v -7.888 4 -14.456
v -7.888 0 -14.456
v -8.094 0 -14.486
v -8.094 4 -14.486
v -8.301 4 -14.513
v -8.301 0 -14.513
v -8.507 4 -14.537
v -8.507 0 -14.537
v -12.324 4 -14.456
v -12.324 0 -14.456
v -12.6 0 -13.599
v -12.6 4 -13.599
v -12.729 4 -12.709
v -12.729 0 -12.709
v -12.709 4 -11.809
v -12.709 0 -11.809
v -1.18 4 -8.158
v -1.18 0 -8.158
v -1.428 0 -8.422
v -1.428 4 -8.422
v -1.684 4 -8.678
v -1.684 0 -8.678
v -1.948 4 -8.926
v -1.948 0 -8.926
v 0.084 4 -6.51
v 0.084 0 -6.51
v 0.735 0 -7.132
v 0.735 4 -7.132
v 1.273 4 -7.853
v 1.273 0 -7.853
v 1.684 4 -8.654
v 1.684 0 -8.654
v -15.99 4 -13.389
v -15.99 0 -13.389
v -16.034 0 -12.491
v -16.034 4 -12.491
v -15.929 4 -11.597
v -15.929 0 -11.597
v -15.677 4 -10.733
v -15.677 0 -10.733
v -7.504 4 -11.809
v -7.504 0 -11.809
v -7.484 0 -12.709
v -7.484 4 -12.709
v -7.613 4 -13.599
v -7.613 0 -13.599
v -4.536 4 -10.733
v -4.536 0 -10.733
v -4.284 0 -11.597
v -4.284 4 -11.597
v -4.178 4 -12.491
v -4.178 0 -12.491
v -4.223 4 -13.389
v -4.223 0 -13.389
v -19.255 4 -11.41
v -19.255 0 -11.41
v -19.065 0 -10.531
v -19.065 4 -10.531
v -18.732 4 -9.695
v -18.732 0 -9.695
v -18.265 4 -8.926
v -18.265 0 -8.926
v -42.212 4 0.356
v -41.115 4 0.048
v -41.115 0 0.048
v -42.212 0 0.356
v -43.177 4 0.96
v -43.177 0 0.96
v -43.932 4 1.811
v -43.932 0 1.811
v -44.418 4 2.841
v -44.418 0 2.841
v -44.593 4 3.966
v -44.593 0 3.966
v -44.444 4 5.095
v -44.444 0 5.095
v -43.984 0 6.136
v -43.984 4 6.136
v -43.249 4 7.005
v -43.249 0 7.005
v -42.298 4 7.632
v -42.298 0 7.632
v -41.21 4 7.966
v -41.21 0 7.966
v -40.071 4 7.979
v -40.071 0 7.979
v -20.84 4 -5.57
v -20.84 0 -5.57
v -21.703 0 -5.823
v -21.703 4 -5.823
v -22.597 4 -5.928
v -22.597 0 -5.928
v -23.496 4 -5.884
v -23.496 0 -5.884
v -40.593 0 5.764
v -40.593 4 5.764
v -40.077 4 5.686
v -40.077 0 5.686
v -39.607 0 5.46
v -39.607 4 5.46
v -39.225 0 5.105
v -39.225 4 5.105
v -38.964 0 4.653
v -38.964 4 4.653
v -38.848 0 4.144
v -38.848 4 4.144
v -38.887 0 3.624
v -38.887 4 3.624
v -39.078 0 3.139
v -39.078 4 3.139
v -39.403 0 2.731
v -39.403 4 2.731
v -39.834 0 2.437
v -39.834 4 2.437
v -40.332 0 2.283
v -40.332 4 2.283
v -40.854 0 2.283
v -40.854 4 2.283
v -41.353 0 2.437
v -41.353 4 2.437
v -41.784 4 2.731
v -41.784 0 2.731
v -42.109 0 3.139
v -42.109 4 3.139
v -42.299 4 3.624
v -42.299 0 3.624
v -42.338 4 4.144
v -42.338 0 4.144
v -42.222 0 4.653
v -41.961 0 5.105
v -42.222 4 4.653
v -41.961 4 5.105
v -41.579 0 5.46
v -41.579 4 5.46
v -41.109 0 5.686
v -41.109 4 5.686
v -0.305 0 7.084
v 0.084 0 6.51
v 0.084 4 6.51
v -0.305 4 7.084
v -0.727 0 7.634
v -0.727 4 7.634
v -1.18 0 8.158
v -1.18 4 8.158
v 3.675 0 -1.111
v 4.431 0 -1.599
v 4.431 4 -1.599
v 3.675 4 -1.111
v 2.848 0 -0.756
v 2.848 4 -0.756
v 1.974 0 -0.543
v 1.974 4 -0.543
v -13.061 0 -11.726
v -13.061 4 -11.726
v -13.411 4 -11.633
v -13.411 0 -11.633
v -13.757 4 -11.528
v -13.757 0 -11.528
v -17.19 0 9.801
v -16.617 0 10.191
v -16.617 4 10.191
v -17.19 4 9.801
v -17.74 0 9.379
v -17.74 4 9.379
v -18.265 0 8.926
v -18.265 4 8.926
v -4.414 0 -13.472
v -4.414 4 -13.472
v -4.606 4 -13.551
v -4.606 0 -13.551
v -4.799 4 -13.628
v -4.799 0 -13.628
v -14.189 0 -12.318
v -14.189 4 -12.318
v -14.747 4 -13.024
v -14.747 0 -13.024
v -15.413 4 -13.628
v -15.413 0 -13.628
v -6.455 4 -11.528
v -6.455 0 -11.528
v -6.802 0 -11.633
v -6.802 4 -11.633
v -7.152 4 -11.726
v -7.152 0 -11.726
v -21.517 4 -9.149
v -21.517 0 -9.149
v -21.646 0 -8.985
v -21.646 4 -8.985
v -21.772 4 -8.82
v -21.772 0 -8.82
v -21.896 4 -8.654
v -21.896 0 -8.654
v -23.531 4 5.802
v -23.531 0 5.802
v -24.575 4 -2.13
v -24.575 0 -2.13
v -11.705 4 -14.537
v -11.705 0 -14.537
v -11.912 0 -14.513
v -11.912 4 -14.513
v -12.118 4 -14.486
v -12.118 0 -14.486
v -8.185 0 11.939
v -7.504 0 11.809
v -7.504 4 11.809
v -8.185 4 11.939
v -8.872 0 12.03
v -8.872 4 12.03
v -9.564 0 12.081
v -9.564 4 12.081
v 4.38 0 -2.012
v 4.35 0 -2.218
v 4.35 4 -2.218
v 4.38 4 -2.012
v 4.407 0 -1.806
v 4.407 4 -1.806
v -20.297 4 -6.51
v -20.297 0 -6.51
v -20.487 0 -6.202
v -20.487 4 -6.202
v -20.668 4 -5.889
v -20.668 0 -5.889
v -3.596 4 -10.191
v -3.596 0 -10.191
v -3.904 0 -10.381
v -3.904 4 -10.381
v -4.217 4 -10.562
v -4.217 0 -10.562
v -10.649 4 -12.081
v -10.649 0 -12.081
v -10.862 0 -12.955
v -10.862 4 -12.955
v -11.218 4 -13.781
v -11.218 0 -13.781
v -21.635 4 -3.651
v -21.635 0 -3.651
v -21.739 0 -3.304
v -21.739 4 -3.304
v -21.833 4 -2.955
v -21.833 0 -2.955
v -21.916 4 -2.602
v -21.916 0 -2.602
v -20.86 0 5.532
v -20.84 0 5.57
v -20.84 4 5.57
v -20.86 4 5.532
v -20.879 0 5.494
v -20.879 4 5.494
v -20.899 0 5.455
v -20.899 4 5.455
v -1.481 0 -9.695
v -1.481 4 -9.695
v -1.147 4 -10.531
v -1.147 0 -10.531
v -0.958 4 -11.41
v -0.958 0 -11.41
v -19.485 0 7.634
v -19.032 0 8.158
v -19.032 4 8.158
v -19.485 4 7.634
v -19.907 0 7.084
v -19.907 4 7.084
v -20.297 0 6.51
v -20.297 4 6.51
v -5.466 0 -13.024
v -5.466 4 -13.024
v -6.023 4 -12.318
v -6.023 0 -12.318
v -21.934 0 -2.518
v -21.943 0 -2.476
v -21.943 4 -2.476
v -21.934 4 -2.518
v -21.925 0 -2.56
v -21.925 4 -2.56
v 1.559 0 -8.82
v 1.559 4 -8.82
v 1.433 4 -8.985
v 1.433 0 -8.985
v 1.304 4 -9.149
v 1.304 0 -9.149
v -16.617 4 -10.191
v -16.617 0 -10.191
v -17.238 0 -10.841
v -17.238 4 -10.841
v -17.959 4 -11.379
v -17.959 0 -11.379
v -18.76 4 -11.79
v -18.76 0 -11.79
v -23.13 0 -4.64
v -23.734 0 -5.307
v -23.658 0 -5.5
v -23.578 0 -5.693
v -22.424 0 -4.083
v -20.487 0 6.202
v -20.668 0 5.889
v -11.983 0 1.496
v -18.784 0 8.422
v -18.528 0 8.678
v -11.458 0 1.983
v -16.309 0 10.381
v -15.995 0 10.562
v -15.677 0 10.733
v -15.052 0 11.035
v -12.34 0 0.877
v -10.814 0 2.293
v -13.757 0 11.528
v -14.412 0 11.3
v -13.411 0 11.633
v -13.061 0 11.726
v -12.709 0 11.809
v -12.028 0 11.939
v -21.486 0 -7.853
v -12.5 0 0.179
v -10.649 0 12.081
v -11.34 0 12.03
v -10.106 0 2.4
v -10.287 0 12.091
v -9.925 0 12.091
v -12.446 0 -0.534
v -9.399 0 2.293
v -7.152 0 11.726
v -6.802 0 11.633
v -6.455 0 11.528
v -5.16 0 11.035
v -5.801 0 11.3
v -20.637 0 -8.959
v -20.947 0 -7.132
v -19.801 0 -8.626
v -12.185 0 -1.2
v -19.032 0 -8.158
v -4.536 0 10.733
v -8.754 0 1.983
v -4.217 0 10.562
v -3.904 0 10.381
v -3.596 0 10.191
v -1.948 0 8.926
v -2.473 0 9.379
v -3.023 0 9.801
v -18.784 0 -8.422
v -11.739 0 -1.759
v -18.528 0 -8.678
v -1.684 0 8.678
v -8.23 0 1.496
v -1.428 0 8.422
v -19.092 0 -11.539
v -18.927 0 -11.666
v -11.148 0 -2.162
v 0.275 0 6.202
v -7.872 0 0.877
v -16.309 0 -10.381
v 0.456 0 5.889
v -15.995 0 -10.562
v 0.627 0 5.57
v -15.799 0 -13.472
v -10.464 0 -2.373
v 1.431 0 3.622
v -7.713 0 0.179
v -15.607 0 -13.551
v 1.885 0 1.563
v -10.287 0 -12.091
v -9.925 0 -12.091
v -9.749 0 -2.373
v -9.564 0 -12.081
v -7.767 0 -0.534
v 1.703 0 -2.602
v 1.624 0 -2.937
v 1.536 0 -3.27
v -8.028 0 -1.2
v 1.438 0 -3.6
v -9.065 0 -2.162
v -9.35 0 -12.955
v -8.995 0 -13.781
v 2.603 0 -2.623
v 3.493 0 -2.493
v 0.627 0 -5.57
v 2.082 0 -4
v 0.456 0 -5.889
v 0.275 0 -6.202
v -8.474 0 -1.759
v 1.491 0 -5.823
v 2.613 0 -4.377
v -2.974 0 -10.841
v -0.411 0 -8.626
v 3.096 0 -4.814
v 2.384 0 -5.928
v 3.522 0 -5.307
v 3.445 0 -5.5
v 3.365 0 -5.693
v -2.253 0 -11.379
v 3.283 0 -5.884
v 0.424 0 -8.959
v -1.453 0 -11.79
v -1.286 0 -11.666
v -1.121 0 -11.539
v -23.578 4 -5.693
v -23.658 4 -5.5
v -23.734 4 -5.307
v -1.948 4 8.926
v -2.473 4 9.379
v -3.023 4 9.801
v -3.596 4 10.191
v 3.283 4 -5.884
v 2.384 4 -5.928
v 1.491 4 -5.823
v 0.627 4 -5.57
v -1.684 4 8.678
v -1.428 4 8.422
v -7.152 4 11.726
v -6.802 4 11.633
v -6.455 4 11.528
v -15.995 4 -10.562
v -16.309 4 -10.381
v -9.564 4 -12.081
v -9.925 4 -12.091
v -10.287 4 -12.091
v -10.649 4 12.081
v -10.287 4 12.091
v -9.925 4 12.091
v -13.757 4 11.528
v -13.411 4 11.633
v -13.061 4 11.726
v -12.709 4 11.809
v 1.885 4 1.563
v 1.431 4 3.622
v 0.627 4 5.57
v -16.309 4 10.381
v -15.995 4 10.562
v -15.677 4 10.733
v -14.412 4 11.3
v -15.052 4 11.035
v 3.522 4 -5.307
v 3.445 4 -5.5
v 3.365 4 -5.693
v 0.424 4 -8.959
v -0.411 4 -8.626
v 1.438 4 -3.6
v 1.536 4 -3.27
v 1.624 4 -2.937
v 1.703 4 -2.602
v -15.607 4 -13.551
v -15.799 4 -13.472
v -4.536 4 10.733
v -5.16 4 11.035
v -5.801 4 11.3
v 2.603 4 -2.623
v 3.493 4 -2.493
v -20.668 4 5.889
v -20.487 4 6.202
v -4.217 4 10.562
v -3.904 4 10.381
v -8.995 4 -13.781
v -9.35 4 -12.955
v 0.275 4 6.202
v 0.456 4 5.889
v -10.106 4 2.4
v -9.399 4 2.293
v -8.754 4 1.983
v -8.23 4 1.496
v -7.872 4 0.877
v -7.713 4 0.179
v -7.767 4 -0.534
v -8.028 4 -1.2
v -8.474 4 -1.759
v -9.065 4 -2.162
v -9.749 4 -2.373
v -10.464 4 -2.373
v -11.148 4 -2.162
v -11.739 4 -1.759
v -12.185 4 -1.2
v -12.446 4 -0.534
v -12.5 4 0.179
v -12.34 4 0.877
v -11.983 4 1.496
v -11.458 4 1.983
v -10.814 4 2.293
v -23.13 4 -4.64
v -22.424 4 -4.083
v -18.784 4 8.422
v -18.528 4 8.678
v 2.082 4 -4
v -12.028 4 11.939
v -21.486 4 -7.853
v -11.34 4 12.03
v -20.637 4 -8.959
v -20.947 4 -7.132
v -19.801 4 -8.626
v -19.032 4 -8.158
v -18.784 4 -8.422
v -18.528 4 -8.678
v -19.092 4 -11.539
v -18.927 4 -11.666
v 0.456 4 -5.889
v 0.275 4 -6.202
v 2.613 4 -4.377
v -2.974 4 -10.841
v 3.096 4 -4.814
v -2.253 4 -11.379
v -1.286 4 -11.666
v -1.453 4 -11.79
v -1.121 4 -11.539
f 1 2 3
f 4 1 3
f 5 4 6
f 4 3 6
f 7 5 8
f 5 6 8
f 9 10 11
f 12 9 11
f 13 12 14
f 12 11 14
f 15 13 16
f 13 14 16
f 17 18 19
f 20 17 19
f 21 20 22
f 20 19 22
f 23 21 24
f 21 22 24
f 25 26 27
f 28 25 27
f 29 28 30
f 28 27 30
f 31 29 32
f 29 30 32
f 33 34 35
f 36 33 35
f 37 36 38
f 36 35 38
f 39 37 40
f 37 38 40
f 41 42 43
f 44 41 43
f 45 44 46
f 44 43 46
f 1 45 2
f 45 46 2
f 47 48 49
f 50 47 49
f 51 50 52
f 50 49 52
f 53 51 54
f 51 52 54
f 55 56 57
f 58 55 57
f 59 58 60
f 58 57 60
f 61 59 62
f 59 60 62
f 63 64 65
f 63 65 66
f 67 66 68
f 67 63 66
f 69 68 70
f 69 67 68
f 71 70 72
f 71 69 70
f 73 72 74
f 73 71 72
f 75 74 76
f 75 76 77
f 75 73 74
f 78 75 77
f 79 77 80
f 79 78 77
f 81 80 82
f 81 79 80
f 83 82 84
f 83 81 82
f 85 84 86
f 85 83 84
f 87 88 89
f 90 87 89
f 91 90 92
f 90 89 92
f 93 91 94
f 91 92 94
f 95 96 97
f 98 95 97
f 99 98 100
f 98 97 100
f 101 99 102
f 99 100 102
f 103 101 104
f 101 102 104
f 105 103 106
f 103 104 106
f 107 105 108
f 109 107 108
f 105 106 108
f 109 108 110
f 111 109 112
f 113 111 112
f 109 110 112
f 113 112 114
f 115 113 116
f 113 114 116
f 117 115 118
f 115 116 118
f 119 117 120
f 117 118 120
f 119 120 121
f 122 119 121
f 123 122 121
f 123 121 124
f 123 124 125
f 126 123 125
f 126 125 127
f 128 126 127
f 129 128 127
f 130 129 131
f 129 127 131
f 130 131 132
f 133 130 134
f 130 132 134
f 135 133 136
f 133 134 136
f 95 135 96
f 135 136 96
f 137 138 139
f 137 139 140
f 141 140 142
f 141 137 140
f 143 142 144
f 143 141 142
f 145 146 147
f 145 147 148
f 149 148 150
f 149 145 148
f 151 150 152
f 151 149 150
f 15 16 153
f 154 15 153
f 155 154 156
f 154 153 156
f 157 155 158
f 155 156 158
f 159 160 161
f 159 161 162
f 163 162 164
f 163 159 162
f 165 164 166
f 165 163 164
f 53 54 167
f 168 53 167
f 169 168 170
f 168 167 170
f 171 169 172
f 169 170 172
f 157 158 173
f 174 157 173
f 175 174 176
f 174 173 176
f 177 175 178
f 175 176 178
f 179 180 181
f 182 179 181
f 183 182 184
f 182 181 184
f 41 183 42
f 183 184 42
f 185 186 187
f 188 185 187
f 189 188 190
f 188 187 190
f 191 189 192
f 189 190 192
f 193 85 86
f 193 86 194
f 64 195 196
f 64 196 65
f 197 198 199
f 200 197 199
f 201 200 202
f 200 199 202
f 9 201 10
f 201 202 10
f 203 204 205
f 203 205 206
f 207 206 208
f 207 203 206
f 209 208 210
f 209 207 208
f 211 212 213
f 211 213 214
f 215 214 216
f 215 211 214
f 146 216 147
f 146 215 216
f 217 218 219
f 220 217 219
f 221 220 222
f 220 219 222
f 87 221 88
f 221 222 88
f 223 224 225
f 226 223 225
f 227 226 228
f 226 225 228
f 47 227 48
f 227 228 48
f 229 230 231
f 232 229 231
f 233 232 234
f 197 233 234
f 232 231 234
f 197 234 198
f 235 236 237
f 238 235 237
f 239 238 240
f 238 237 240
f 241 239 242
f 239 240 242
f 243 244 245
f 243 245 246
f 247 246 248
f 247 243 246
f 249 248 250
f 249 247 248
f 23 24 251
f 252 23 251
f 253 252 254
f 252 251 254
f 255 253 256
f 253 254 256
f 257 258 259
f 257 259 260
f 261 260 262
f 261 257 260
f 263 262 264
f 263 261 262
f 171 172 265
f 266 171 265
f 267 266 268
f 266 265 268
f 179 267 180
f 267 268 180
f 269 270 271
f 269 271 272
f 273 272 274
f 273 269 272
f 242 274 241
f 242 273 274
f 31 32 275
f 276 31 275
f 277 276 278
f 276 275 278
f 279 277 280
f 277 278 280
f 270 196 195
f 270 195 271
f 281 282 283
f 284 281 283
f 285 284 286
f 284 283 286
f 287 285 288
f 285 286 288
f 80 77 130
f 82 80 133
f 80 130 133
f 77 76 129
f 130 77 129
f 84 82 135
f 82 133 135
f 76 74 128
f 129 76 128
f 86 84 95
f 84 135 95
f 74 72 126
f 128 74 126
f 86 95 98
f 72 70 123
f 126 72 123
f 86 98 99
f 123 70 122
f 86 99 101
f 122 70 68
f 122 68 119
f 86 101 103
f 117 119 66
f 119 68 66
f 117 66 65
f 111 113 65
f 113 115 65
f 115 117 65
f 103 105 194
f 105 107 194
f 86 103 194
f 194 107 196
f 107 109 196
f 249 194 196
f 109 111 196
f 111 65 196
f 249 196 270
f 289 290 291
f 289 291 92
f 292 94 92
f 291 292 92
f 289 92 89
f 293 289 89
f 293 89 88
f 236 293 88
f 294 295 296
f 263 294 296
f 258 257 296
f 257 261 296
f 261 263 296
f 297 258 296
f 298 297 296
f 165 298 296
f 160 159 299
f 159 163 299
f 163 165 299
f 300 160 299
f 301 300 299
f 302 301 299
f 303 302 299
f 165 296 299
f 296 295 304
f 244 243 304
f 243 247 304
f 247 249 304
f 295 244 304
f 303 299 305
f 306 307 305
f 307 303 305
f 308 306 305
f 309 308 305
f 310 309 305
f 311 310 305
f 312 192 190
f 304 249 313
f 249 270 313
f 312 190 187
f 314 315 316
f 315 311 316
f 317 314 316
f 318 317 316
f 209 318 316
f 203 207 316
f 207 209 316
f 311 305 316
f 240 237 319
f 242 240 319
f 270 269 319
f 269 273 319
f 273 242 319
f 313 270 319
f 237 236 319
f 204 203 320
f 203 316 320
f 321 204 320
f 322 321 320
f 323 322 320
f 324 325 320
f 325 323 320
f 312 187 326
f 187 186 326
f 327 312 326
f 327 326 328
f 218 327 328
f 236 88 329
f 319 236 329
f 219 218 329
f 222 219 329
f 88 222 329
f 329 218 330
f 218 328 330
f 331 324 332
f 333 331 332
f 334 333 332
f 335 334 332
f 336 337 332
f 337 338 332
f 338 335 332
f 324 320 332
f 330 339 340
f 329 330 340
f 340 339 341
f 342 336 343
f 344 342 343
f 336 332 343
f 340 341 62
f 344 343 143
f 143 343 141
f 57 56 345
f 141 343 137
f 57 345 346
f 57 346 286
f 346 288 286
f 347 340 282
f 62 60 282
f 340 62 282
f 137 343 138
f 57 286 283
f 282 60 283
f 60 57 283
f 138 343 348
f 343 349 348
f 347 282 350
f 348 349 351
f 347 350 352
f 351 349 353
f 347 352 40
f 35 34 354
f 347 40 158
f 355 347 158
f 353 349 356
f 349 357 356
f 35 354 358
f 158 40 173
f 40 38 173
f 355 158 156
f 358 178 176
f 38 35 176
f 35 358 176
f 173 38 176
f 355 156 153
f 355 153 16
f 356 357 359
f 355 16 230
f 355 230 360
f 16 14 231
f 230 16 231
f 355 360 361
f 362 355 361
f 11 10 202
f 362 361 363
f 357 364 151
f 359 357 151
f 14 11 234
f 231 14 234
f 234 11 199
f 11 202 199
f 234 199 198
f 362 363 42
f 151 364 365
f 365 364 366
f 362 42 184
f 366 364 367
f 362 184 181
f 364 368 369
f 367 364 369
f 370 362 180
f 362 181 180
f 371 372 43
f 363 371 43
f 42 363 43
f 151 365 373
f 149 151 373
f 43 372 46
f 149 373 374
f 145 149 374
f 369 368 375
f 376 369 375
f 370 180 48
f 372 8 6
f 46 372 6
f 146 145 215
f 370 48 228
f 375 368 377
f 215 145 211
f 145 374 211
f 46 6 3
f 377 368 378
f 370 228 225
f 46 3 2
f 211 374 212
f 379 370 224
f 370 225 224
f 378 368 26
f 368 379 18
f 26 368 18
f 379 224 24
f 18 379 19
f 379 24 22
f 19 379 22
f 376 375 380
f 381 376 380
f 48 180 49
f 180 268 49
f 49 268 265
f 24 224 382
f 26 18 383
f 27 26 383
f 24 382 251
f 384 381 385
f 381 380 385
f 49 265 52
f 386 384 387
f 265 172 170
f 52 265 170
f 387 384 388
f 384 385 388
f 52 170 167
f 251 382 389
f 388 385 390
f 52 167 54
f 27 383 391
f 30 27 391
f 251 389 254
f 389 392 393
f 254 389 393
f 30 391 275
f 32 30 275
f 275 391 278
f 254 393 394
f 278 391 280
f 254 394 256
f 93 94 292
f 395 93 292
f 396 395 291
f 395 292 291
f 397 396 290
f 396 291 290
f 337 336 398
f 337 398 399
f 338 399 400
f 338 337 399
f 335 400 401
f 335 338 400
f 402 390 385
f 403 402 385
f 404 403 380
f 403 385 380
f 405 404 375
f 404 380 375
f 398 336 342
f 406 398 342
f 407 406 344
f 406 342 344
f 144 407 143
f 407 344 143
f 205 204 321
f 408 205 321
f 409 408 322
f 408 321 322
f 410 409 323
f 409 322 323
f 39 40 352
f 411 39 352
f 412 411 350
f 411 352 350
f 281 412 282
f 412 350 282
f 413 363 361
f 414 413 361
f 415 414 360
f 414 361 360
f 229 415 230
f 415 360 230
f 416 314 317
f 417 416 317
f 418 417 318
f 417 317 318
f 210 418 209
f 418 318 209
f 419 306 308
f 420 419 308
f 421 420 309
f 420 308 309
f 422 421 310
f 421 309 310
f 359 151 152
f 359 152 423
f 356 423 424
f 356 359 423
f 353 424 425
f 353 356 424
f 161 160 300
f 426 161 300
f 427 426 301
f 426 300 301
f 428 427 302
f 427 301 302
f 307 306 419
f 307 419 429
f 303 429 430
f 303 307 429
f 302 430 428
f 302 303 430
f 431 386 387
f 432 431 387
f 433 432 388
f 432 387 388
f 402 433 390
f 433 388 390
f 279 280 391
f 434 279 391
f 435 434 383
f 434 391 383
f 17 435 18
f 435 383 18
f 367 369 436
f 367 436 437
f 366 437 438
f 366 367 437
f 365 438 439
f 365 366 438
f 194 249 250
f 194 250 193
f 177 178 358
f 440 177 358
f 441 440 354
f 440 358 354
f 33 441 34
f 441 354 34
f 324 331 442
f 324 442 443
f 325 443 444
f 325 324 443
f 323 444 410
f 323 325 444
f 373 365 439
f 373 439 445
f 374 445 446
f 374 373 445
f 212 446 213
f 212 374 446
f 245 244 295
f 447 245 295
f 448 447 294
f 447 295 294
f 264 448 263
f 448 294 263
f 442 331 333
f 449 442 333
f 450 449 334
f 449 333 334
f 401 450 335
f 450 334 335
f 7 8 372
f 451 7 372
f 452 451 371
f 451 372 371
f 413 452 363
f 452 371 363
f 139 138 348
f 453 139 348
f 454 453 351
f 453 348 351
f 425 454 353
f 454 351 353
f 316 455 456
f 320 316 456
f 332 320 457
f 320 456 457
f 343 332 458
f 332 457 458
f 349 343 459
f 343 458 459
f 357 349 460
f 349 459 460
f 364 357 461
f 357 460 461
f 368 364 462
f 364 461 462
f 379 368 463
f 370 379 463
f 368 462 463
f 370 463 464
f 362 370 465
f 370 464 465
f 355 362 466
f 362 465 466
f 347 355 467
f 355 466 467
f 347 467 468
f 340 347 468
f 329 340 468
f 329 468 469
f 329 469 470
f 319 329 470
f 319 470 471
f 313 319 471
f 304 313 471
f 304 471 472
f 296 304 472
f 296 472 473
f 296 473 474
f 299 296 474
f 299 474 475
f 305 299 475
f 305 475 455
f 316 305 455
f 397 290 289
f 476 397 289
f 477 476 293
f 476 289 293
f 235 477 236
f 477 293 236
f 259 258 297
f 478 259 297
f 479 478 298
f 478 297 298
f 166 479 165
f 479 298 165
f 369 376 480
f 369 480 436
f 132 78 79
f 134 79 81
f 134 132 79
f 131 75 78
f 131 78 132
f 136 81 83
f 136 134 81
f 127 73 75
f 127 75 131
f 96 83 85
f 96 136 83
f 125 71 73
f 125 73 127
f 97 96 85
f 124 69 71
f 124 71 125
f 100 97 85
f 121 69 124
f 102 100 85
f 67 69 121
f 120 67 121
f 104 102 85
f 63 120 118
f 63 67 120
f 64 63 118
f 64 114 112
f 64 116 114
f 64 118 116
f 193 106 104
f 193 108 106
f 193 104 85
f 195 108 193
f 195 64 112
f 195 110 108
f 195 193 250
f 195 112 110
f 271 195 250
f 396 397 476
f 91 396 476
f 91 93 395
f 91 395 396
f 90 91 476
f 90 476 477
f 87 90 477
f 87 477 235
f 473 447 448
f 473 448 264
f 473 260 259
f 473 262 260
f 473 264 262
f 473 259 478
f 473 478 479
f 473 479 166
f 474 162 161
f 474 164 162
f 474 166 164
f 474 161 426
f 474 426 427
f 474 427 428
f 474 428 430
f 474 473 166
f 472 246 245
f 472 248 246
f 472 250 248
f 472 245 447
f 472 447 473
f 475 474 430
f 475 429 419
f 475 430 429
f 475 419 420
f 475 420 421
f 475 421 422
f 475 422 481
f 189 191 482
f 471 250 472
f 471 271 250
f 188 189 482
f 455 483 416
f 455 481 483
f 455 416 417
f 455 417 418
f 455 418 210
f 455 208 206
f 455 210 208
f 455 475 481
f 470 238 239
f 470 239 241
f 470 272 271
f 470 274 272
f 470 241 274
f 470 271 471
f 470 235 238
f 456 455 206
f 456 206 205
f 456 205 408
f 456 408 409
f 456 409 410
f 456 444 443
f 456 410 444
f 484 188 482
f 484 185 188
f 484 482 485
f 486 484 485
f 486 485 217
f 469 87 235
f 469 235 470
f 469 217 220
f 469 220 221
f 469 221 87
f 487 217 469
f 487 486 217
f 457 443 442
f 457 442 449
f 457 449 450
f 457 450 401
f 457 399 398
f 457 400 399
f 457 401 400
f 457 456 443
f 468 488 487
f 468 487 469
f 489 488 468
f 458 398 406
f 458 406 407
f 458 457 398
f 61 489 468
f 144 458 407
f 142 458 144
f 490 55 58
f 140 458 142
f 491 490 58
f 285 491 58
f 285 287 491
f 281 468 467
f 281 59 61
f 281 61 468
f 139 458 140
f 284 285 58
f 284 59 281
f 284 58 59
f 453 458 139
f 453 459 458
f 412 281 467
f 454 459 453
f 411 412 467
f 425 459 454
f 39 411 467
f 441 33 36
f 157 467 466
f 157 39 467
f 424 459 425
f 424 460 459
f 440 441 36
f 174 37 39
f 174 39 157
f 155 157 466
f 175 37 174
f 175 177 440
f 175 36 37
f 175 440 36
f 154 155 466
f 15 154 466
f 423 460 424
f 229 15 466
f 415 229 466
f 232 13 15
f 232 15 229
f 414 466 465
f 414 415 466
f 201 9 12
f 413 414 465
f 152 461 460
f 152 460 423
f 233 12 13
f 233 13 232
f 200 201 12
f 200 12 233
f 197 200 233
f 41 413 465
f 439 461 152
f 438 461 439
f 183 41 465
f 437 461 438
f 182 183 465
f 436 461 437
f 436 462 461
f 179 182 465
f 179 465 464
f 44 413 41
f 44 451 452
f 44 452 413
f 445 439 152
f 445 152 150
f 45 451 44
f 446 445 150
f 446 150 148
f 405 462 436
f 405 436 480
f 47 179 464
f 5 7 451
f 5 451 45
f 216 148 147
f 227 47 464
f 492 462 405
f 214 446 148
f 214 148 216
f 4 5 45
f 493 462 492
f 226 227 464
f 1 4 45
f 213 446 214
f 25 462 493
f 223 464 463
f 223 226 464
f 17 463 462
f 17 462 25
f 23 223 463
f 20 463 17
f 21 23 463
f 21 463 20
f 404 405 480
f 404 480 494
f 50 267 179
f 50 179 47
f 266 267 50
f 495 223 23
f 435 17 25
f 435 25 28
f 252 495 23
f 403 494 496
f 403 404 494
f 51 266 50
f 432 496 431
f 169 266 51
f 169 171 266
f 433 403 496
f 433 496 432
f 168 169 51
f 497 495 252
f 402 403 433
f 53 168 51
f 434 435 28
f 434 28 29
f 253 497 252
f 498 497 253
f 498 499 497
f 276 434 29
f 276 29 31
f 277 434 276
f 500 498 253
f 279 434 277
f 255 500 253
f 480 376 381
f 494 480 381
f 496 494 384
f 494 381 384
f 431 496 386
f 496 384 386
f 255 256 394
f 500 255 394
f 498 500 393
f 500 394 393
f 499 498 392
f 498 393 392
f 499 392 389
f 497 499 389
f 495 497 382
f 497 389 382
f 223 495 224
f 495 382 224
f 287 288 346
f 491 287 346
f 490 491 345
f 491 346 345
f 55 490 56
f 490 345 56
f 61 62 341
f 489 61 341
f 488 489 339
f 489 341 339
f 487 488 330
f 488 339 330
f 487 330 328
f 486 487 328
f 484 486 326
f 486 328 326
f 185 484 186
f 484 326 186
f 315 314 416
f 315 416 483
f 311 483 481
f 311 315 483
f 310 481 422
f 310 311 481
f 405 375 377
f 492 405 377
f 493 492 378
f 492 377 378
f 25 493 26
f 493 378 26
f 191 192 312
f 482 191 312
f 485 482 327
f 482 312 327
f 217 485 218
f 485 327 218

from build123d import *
from build123d.topology import SkipClean

# Parameters (mm, degrees)
SKETCH1_R           = 1.5
BOSS_EXTRUDE1_DEPTH = 4
SKETCH3_R           = 1.75
BOSS_EXTRUDE2_DEPTH = 4
CUT_EXTRUDE1_START  = -4
CUT_EXTRUDE1_DEPTH  = 4
CUT_EXTRUDE2_REACH  = 49.073
SKETCH5_R           = 2.4


with BuildPart() as part:
    # Sketch1 → Boss-Extrude1 (new body)
    with BuildSketch(Plane(origin=(0, 0, 0), x_dir=(1, 0, 0), z_dir=(0, 1, 0))):
        with BuildLine():
            Line((20.643657446, 4), (2.081641936, 4))
            ThreePointArc((2.081641936, 4), (2.861028333, 4.588201733), (3.521749436, 5.30713988))
            ThreePointArc((3.521749436, 5.30713988), (3.405395609, 5.596745198), (3.282888305, 5.883801663))
            ThreePointArc((3.282888305, 5.883801663), (1.93527598, 5.894040025), (0.627094961, 5.57027124))
            ThreePointArc((0.627094961, 5.57027124), (0.366286148, 6.046375), (0.084372603, 6.510293938))
            ThreePointArc((0.084372603, 6.510293938), (1.018855105, 7.48132754), (1.683794586, 8.65351323))
            ThreePointArc((1.683794586, 8.65351323), (1.496450048, 8.903135899), (1.303821399, 9.148703928))
            ThreePointArc((1.303821399, 9.148703928), (-0.000522033, 8.809805691), (-1.180330337, 8.158486898))
            ThreePointArc((-1.180330337, 8.158486898), (-1.555477026, 8.550865528), (-1.947855656, 8.926012217))
            ThreePointArc((-1.947855656, 8.926012217), (-1.296536862, 10.105820521), (-0.957638625, 11.410163953))
            ThreePointArc((-0.957638625, 11.410163953), (-1.203206655, 11.602792602), (-1.452829324, 11.79013714))
            ThreePointArc((-1.452829324, 11.79013714), (-2.625015014, 11.125197659), (-3.596048616, 10.190715157))
            ThreePointArc((-3.596048616, 10.190715157), (-4.059967554, 10.472628702), (-4.536071314, 10.733437515))
            ThreePointArc((-4.536071314, 10.733437515), (-4.212302529, 12.041618533), (-4.222540891, 13.389230859))
            ThreePointArc((-4.222540891, 13.389230859), (-4.509597355, 13.511738163), (-4.799202674, 13.62809199))
            ThreePointArc((-4.799202674, 13.62809199), (-5.759348103, 12.682425791), (-6.455432668, 11.528463019))
            ThreePointArc((-6.455432668, 11.528463019), (-6.976508546, 11.680699536), (-7.503891752, 11.809396783))
            ThreePointArc((-7.503891752, 11.809396783), (-7.529737283, 13.156800143), (-7.888414517, 14.455843809))
            ThreePointArc((-7.888414517, 14.455843809), (-8.197396993, 14.499881098), (-8.507248835, 14.537314892))
            ThreePointArc((-8.507248835, 14.537314892), (-9.18992168, 13.375367565), (-9.563620196, 12.080565177))
            ThreePointArc((-9.563620196, 12.080565177), (-10.106342554, 12.09275), (-10.649064912, 12.080565177))
            ThreePointArc((-10.649064912, 12.080565177), (-11.022763428, 13.375367565), (-11.705436272, 14.537314892))
            ThreePointArc((-11.705436272, 14.537314892), (-12.015288115, 14.499881098), (-12.324270591, 14.455843809))
            ThreePointArc((-12.324270591, 14.455843809), (-12.682947825, 13.156800143), (-12.708793355, 11.809396783))
            ThreePointArc((-12.708793355, 11.809396783), (-13.236176561, 11.680699536), (-13.757252439, 11.528463019))
            ThreePointArc((-13.757252439, 11.528463019), (-14.453337005, 12.682425791), (-15.413482434, 13.62809199))
            ThreePointArc((-15.413482434, 13.62809199), (-15.703087752, 13.511738163), (-15.990144217, 13.389230859))
            ThreePointArc((-15.990144217, 13.389230859), (-16.000382579, 12.041618533), (-15.676613793, 10.733437515))
            ThreePointArc((-15.676613793, 10.733437515), (-16.152717554, 10.472628702), (-16.616636492, 10.190715157))
            ThreePointArc((-16.616636492, 10.190715157), (-17.587670094, 11.125197659), (-18.759855783, 11.79013714))
            ThreePointArc((-18.759855783, 11.79013714), (-19.009478453, 11.602792602), (-19.255046482, 11.410163953))
            ThreePointArc((-19.255046482, 11.410163953), (-18.916148245, 10.105820521), (-18.264829452, 8.926012217))
            ThreePointArc((-18.264829452, 8.926012217), (-18.657208082, 8.550865528), (-19.032354771, 8.158486898))
            ThreePointArc((-19.032354771, 8.158486898), (-20.212163074, 8.809805691), (-21.516506507, 9.148703928))
            ThreePointArc((-21.516506507, 9.148703928), (-21.709135156, 8.903135899), (-21.896479694, 8.65351323))
            ThreePointArc((-21.896479694, 8.65351323), (-21.231540213, 7.48132754), (-20.297057711, 6.510293938))
            ThreePointArc((-20.297057711, 6.510293938), (-20.578971255, 6.046375), (-20.839780068, 5.57027124))
            ThreePointArc((-20.839780068, 5.57027124), (-22.147961087, 5.894040025), (-23.495573413, 5.883801663))
            ThreePointArc((-23.495573413, 5.883801663), (-23.618080717, 5.596745198), (-23.734434544, 5.30713988))
            ThreePointArc((-23.734434544, 5.30713988), (-22.788768345, 4.346994451), (-21.634805572, 3.650909885))
            ThreePointArc((-21.634805572, 3.650909885), (-21.78704209, 3.129834008), (-21.915739337, 2.602450802))
            ThreePointArc((-21.915739337, 2.602450802), (-23.263142697, 2.576605271), (-24.562186363, 2.217928037))
            ThreePointArc((-24.562186363, 2.217928037), (-24.606223651, 1.908945561), (-24.643657446, 1.599093719))
            ThreePointArc((-24.643657446, 1.599093719), (-23.481710119, 0.916420874), (-22.186907731, 0.542722358))
            ThreePointArc((-22.186907731, 0.542722358), (-22.199092554, 0), (-22.186907731, -0.542722358))
            ThreePointArc((-22.186907731, -0.542722358), (-23.481710119, -0.916420874), (-24.643657446, -1.599093719))
            ThreePointArc((-24.643657446, -1.599093719), (-24.606223651, -1.908945561), (-24.562186363, -2.217928037))
            ThreePointArc((-24.562186363, -2.217928037), (-23.263142697, -2.576605271), (-21.915739337, -2.602450802))
            ThreePointArc((-21.915739337, -2.602450802), (-21.78704209, -3.129834008), (-21.634805572, -3.650909885))
            ThreePointArc((-21.634805572, -3.650909885), (-22.788768345, -4.346994451), (-23.734434544, -5.30713988))
            ThreePointArc((-23.734434544, -5.30713988), (-23.618080717, -5.596745198), (-23.495573413, -5.883801663))
            ThreePointArc((-23.495573413, -5.883801663), (-22.147961087, -5.894040025), (-20.839780068, -5.57027124))
            ThreePointArc((-20.839780068, -5.57027124), (-20.578971255, -6.046375), (-20.297057711, -6.510293938))
            ThreePointArc((-20.297057711, -6.510293938), (-21.231540213, -7.48132754), (-21.896479694, -8.65351323))
            ThreePointArc((-21.896479694, -8.65351323), (-21.709135156, -8.903135899), (-21.516506507, -9.148703928))
            ThreePointArc((-21.516506507, -9.148703928), (-20.212163074, -8.809805691), (-19.032354771, -8.158486898))
            ThreePointArc((-19.032354771, -8.158486898), (-18.657208082, -8.550865528), (-18.264829452, -8.926012217))
            ThreePointArc((-18.264829452, -8.926012217), (-18.916148245, -10.105820521), (-19.255046482, -11.410163953))
            ThreePointArc((-19.255046482, -11.410163953), (-19.009478453, -11.602792602), (-18.759855783, -11.79013714))
            ThreePointArc((-18.759855783, -11.79013714), (-17.587670094, -11.125197659), (-16.616636492, -10.190715157))
            ThreePointArc((-16.616636492, -10.190715157), (-16.152717554, -10.472628702), (-15.676613793, -10.733437515))
            ThreePointArc((-15.676613793, -10.733437515), (-16.000382579, -12.041618533), (-15.990144217, -13.389230859))
            ThreePointArc((-15.990144217, -13.389230859), (-15.703087752, -13.511738163), (-15.413482434, -13.62809199))
            ThreePointArc((-15.413482434, -13.62809199), (-14.453337005, -12.682425791), (-13.757252439, -11.528463019))
            ThreePointArc((-13.757252439, -11.528463019), (-13.236176561, -11.680699536), (-12.708793355, -11.809396783))
            ThreePointArc((-12.708793355, -11.809396783), (-12.682947825, -13.156800143), (-12.324270591, -14.455843809))
            ThreePointArc((-12.324270591, -14.455843809), (-12.015288115, -14.499881098), (-11.705436272, -14.537314892))
            ThreePointArc((-11.705436272, -14.537314892), (-11.022763428, -13.375367565), (-10.649064912, -12.080565177))
            ThreePointArc((-10.649064912, -12.080565177), (-10.106342554, -12.09275), (-9.563620196, -12.080565177))
            ThreePointArc((-9.563620196, -12.080565177), (-9.18992168, -13.375367565), (-8.507248835, -14.537314892))
            ThreePointArc((-8.507248835, -14.537314892), (-8.197396993, -14.499881098), (-7.888414517, -14.455843809))
            ThreePointArc((-7.888414517, -14.455843809), (-7.529737283, -13.156800143), (-7.503891752, -11.809396783))
            ThreePointArc((-7.503891752, -11.809396783), (-6.976508546, -11.680699536), (-6.455432668, -11.528463019))
            ThreePointArc((-6.455432668, -11.528463019), (-5.759348103, -12.682425791), (-4.799202674, -13.62809199))
            ThreePointArc((-4.799202674, -13.62809199), (-4.509597355, -13.511738163), (-4.222540891, -13.389230859))
            ThreePointArc((-4.222540891, -13.389230859), (-4.212302529, -12.041618533), (-4.536071314, -10.733437515))
            ThreePointArc((-4.536071314, -10.733437515), (-4.059967554, -10.472628702), (-3.596048616, -10.190715157))
            ThreePointArc((-3.596048616, -10.190715157), (-2.625015014, -11.125197659), (-1.452829324, -11.79013714))
            ThreePointArc((-1.452829324, -11.79013714), (-1.203206655, -11.602792602), (-0.957638625, -11.410163953))
            ThreePointArc((-0.957638625, -11.410163953), (-1.296536862, -10.105820521), (-1.947855656, -8.926012217))
            ThreePointArc((-1.947855656, -8.926012217), (-1.555477026, -8.550865528), (-1.180330337, -8.158486898))
            ThreePointArc((-1.180330337, -8.158486898), (-0.000522033, -8.809805691), (1.303821399, -9.148703928))
            ThreePointArc((1.303821399, -9.148703928), (1.496450048, -8.903135899), (1.683794586, -8.65351323))
            ThreePointArc((1.683794586, -8.65351323), (1.018855105, -7.48132754), (0.084372603, -6.510293938))
            ThreePointArc((0.084372603, -6.510293938), (0.366286148, -6.046375), (0.627094961, -5.57027124))
            ThreePointArc((0.627094961, -5.57027124), (1.93527598, -5.894040025), (3.282888305, -5.883801663))
            ThreePointArc((3.282888305, -5.883801663), (3.405395609, -5.596745198), (3.521749436, -5.30713988))
            ThreePointArc((3.521749436, -5.30713988), (2.861028333, -4.588201733), (2.081641936, -4))
            Line((2.081641936, -4), (20.643657446, -4))
            ThreePointArc((20.643657446, -4), (24.643657446, 0), (20.643657446, 4))
        make_face()
        with Locations(Location((-10.106342554, 0, 0), (0, 0, 270))):
            Circle(SKETCH1_R, mode=Mode.SUBTRACT)
        with Locations(Location((20.643657446, 0, 0), (0, 0, 270))):
            Circle(SKETCH1_R, mode=Mode.SUBTRACT)
    extrude(amount=BOSS_EXTRUDE1_DEPTH)

    # Sketch3 → Boss-Extrude2 (add)
    with BuildSketch(Plane(origin=(0, 4, 0), x_dir=(1, 0, 0), z_dir=(0, 1, 0))):
        with BuildLine():
            ThreePointArc((-9.584237785, -3.965779445), (-14.072121999, -0.522104769), (-10.628447323, 3.965779445))
            Line((-10.628447323, 3.965779445), (-41.11537681, -0.047900965))
            ThreePointArc((-41.11537681, -0.047900965), (-44.559051487, -4.53578518), (-40.071167272, -7.979459856))
            Line((-40.071167272, -7.979459856), (-9.584237785, -3.965779445))
        make_face()
        with Locations(Location((-40.593272041, -4.013680411, 0), (0, 0, 270))):
            Circle(SKETCH3_R, mode=Mode.SUBTRACT)
    extrude(amount=-BOSS_EXTRUDE2_DEPTH)

    # Sketch4 → Cut-Extrude1 (cut)
    with SkipClean():  # the faces are left unmerged after this step: merging them gives an invalid solid
        with BuildSketch(Plane(origin=(0, 4, 0), x_dir=(1, 0, 0), z_dir=(0, 1, 0)).offset(CUT_EXTRUDE1_START)):
            with BuildLine():
                ThreePointArc((20.643657446, -4), (24.643657446, 0), (20.643657446, 4))
                Line((20.643657446, 4), (2.081641936, 4))
                Line((2.081641936, 4), (1.43808022, 3.600125745))
                ThreePointArc((1.43808022, 3.600125745), (1.581217534, 3.104116905), (1.70305423, 2.602450802))
                ThreePointArc((1.70305423, 2.602450802), (3.050457589, 2.576605271), (4.349501255, 2.217928037))
                ThreePointArc((4.349501255, 2.217928037), (4.393538544, 1.908945561), (4.430972339, 1.599093719))
                ThreePointArc((4.430972339, 1.599093719), (3.269025011, 0.916420874), (1.974222624, 0.542722358))
                ThreePointArc((1.974222624, 0.542722358), (1.70305423, -2.602450802), (0.627094961, -5.57027124))
                ThreePointArc((0.627094961, -5.57027124), (1.93527598, -5.894040025), (3.282888305, -5.883801663))
                ThreePointArc((3.282888305, -5.883801663), (3.405395609, -5.596745198), (3.521749436, -5.30713988))
                ThreePointArc((3.521749436, -5.30713988), (2.861028333, -4.588201733), (2.081641936, -4))
                Line((2.081641936, -4), (20.643657446, -4))
            make_face()
            with BuildLine():
                ThreePointArc((1.683794586, -8.65351323), (1.018855105, -7.48132754), (0.084372603, -6.510293938))
                ThreePointArc((0.084372603, -6.510293938), (-0.512518948, -7.361599771), (-1.180330337, -8.158486898))
                ThreePointArc((-1.180330337, -8.158486898), (-0.000522033, -8.809805691), (1.303821399, -9.148703928))
                ThreePointArc((1.303821399, -9.148703928), (1.496450048, -8.903135899), (1.683794586, -8.65351323))
            make_face()
            with BuildLine():
                ThreePointArc((-0.957638625, -11.410163953), (-1.296536862, -10.105820521), (-1.947855656, -8.926012217))
                ThreePointArc((-1.947855656, -8.926012217), (-2.744742783, -9.593823606), (-3.596048616, -10.190715157))
                ThreePointArc((-3.596048616, -10.190715157), (-2.625015014, -11.125197659), (-1.452829324, -11.79013714))
                ThreePointArc((-1.452829324, -11.79013714), (-1.203206655, -11.602792602), (-0.957638625, -11.410163953))
            make_face()
            with BuildLine():
                ThreePointArc((-4.222540891, -13.389230859), (-4.212302529, -12.041618533), (-4.536071314, -10.733437515))
                ThreePointArc((-4.536071314, -10.733437515), (-5.478647477, -11.172244217), (-6.455432668, -11.528463019))
                ThreePointArc((-6.455432668, -11.528463019), (-5.759348103, -12.682425791), (-4.799202674, -13.62809199))
                ThreePointArc((-4.799202674, -13.62809199), (-4.509597355, -13.511738163), (-4.222540891, -13.389230859))
            make_face()
            with BuildLine():
                ThreePointArc((-7.888414517, -14.455843809), (-7.529737283, -13.156800143), (-7.503891752, -11.809396783))
                ThreePointArc((-7.503891752, -11.809396783), (-8.527921943, -11.989294847), (-9.563620196, -12.080565177))
                ThreePointArc((-9.563620196, -12.080565177), (-9.18992168, -13.375367565), (-8.507248835, -14.537314892))
                ThreePointArc((-8.507248835, -14.537314892), (-8.197396993, -14.499881098), (-7.888414517, -14.455843809))
            make_face()
            with BuildLine():
                ThreePointArc((-11.705436272, -14.537314892), (-11.022763428, -13.375367565), (-10.649064912, -12.080565177))
                ThreePointArc((-10.649064912, -12.080565177), (-11.684763165, -11.989294847), (-12.708793355, -11.809396783))
                ThreePointArc((-12.708793355, -11.809396783), (-12.682947825, -13.156800143), (-12.324270591, -14.455843809))
                ThreePointArc((-12.324270591, -14.455843809), (-12.015288115, -14.499881098), (-11.705436272, -14.537314892))
            make_face()
            with BuildLine():
                ThreePointArc((-15.413482434, -13.62809199), (-14.453337005, -12.682425791), (-13.757252439, -11.528463019))
                ThreePointArc((-13.757252439, -11.528463019), (-14.734037631, -11.172244217), (-15.676613793, -10.733437515))
                ThreePointArc((-15.676613793, -10.733437515), (-16.000382579, -12.041618533), (-15.990144217, -13.389230859))
                ThreePointArc((-15.990144217, -13.389230859), (-15.703087752, -13.511738163), (-15.413482434, -13.62809199))
            make_face()
            with BuildLine():
                ThreePointArc((-18.759855783, -11.79013714), (-17.587670094, -11.125197659), (-16.616636492, -10.190715157))
                ThreePointArc((-16.616636492, -10.190715157), (-17.467942324, -9.593823606), (-18.264829452, -8.926012217))
                ThreePointArc((-18.264829452, -8.926012217), (-18.916148245, -10.105820521), (-19.255046482, -11.410163953))
                ThreePointArc((-19.255046482, -11.410163953), (-19.009478453, -11.602792602), (-18.759855783, -11.79013714))
            make_face()
            with BuildLine():
                ThreePointArc((-21.516506507, -9.148703928), (-20.212163074, -8.809805691), (-19.032354771, -8.158486898))
                ThreePointArc((-19.032354771, -8.158486898), (-19.70016616, -7.361599771), (-20.297057711, -6.510293938))
                ThreePointArc((-20.297057711, -6.510293938), (-21.231540213, -7.48132754), (-21.896479694, -8.65351323))
                ThreePointArc((-21.896479694, -8.65351323), (-21.709135156, -8.903135899), (-21.516506507, -9.148703928))
            make_face()
            with BuildLine():
                ThreePointArc((-21.942853375, 2.47620963), (-21.92946485, 2.539366405), (-21.915739337, 2.602450802))
                ThreePointArc((-21.915739337, 2.602450802), (-23.263142697, 2.576605271), (-24.562186363, 2.217928037))
                ThreePointArc((-24.562186363, 2.217928037), (-24.56889027, 2.173784387), (-24.575459377, 2.129620475))
                Line((-24.575459377, 2.129620475), (-21.942853375, 2.47620963))
            make_face()
            with BuildLine():
                ThreePointArc((-23.495573413, -5.883801663), (-22.147961087, -5.894040025), (-20.839780068, -5.57027124))
                ThreePointArc((-20.839780068, -5.57027124), (-20.869365339, -5.512888815), (-20.898643838, -5.455349261))
                Line((-20.898643838, -5.455349261), (-23.531249839, -5.801938416))
                ThreePointArc((-23.531249839, -5.801938416), (-23.513474108, -5.842897269), (-23.495573413, -5.883801663))
            make_face()
        extrude(amount=CUT_EXTRUDE1_DEPTH, mode=Mode.SUBTRACT)

    # Sketch5 → Cut-Extrude2 (cut, up to next)
    with BuildSketch(Plane(origin=(0, 4, 0), x_dir=(1, 0, 0), z_dir=(0, 1, 0)), mode=Mode.PRIVATE) as cut_extrude2_sk1:
        with Locations(Location((-10.106342554, 0, 0), (0, 0, 270))):
            Circle(SKETCH5_R)
    cut_extrude2_tool1 = extrude(cut_extrude2_sk1.sketch, amount=-CUT_EXTRUDE2_REACH, mode=Mode.PRIVATE) & part.part
    add(cut_extrude2_tool1.solids().sort_by_distance((-10.106343, 4, 0))[0], mode=Mode.SUBTRACT)


solid = part.part
